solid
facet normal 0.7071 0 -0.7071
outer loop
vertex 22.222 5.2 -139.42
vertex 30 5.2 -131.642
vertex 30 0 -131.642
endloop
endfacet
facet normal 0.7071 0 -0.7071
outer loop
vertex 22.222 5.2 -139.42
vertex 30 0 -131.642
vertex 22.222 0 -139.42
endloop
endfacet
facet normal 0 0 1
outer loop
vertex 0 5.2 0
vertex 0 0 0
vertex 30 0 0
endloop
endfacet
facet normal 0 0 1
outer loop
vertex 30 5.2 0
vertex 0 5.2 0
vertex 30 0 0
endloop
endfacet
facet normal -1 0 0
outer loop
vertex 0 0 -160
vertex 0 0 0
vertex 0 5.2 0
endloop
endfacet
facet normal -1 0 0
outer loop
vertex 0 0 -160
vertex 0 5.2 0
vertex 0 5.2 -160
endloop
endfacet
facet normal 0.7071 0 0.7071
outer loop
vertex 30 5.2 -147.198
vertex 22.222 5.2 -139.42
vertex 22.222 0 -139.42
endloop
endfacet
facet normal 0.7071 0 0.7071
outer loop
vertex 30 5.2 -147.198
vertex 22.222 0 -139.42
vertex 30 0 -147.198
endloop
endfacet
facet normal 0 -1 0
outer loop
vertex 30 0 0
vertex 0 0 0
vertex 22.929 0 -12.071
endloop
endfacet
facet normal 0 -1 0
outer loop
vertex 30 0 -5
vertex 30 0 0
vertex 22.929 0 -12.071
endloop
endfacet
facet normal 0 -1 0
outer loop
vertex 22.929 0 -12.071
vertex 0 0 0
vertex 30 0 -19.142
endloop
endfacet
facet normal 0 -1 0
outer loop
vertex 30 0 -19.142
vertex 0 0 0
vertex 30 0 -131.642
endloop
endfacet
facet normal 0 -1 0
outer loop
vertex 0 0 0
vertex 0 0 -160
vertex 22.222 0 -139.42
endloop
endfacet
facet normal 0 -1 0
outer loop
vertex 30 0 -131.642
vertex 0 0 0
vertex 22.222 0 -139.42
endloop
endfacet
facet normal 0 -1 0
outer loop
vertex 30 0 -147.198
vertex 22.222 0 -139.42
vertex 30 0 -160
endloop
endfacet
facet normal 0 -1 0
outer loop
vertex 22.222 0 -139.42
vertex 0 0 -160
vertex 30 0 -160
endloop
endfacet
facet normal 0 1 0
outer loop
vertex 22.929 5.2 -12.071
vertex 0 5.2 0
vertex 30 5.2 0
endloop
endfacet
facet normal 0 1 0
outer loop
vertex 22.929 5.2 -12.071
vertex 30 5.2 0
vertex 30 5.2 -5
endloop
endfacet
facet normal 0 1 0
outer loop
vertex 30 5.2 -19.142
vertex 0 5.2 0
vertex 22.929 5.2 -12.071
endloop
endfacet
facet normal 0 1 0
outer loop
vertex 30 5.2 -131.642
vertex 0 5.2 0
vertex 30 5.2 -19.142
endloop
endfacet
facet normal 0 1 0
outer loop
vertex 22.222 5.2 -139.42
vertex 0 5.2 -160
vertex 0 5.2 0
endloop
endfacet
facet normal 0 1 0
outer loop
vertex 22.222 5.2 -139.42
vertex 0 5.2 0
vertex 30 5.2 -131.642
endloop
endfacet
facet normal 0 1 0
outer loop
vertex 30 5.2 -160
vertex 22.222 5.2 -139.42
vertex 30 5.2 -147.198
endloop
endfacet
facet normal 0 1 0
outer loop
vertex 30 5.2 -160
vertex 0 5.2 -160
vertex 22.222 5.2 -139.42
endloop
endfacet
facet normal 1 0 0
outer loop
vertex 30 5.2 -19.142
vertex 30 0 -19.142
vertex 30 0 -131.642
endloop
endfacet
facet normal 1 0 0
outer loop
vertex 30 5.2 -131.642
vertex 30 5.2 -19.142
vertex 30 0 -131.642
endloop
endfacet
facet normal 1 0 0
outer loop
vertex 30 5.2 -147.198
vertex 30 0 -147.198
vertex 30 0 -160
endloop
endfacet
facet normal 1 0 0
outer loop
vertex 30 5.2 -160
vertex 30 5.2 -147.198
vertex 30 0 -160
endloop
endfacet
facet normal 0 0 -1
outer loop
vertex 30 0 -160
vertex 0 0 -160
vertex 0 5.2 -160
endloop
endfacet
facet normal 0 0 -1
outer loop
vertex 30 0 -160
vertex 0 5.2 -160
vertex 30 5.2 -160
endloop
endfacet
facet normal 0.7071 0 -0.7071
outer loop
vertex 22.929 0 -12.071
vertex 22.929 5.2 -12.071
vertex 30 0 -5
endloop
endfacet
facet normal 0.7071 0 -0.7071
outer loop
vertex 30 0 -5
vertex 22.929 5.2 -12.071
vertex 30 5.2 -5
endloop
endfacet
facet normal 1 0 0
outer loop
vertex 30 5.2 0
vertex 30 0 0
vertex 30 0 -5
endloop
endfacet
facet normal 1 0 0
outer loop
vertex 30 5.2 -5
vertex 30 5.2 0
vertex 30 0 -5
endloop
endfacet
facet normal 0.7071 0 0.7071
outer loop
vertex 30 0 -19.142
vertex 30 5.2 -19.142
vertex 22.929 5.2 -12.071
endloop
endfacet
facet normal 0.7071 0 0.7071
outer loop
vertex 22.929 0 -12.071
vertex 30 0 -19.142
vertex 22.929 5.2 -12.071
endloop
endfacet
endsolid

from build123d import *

# Parameters (mm, degrees)
SKETCH1_W           = 30
SKETCH1_H           = 160
BOSS_EXTRUDE1_DEPTH = 5.2
CUT_EXTRUDE1_DEPTH  = 10


with BuildPart() as part:
    # Sketch1 → Boss-Extrude1 (new body)
    with BuildSketch(Plane(origin=(0, 0, 0), x_dir=(1, 0, 0), z_dir=(0, 1, 0))):
        with Locations((15, 80)):
            Rectangle(SKETCH1_W, SKETCH1_H)
    extrude(amount=BOSS_EXTRUDE1_DEPTH)

    # Sketch2 → Cut-Extrude1 (cut)
    with BuildSketch(Plane(origin=(0, 5.2, 0), x_dir=(1, 0, 0), z_dir=(0, 1, 0))):
        Polygon((30, 131.642135624), (22.221825407, 139.420310217), (30, 147.19848481), align=None)
        Polygon((30, 19.142135624), (22.928932188, 12.071067812), (30, 5), align=None)
    extrude(amount=-CUT_EXTRUDE1_DEPTH, mode=Mode.SUBTRACT)


solid = part.part
